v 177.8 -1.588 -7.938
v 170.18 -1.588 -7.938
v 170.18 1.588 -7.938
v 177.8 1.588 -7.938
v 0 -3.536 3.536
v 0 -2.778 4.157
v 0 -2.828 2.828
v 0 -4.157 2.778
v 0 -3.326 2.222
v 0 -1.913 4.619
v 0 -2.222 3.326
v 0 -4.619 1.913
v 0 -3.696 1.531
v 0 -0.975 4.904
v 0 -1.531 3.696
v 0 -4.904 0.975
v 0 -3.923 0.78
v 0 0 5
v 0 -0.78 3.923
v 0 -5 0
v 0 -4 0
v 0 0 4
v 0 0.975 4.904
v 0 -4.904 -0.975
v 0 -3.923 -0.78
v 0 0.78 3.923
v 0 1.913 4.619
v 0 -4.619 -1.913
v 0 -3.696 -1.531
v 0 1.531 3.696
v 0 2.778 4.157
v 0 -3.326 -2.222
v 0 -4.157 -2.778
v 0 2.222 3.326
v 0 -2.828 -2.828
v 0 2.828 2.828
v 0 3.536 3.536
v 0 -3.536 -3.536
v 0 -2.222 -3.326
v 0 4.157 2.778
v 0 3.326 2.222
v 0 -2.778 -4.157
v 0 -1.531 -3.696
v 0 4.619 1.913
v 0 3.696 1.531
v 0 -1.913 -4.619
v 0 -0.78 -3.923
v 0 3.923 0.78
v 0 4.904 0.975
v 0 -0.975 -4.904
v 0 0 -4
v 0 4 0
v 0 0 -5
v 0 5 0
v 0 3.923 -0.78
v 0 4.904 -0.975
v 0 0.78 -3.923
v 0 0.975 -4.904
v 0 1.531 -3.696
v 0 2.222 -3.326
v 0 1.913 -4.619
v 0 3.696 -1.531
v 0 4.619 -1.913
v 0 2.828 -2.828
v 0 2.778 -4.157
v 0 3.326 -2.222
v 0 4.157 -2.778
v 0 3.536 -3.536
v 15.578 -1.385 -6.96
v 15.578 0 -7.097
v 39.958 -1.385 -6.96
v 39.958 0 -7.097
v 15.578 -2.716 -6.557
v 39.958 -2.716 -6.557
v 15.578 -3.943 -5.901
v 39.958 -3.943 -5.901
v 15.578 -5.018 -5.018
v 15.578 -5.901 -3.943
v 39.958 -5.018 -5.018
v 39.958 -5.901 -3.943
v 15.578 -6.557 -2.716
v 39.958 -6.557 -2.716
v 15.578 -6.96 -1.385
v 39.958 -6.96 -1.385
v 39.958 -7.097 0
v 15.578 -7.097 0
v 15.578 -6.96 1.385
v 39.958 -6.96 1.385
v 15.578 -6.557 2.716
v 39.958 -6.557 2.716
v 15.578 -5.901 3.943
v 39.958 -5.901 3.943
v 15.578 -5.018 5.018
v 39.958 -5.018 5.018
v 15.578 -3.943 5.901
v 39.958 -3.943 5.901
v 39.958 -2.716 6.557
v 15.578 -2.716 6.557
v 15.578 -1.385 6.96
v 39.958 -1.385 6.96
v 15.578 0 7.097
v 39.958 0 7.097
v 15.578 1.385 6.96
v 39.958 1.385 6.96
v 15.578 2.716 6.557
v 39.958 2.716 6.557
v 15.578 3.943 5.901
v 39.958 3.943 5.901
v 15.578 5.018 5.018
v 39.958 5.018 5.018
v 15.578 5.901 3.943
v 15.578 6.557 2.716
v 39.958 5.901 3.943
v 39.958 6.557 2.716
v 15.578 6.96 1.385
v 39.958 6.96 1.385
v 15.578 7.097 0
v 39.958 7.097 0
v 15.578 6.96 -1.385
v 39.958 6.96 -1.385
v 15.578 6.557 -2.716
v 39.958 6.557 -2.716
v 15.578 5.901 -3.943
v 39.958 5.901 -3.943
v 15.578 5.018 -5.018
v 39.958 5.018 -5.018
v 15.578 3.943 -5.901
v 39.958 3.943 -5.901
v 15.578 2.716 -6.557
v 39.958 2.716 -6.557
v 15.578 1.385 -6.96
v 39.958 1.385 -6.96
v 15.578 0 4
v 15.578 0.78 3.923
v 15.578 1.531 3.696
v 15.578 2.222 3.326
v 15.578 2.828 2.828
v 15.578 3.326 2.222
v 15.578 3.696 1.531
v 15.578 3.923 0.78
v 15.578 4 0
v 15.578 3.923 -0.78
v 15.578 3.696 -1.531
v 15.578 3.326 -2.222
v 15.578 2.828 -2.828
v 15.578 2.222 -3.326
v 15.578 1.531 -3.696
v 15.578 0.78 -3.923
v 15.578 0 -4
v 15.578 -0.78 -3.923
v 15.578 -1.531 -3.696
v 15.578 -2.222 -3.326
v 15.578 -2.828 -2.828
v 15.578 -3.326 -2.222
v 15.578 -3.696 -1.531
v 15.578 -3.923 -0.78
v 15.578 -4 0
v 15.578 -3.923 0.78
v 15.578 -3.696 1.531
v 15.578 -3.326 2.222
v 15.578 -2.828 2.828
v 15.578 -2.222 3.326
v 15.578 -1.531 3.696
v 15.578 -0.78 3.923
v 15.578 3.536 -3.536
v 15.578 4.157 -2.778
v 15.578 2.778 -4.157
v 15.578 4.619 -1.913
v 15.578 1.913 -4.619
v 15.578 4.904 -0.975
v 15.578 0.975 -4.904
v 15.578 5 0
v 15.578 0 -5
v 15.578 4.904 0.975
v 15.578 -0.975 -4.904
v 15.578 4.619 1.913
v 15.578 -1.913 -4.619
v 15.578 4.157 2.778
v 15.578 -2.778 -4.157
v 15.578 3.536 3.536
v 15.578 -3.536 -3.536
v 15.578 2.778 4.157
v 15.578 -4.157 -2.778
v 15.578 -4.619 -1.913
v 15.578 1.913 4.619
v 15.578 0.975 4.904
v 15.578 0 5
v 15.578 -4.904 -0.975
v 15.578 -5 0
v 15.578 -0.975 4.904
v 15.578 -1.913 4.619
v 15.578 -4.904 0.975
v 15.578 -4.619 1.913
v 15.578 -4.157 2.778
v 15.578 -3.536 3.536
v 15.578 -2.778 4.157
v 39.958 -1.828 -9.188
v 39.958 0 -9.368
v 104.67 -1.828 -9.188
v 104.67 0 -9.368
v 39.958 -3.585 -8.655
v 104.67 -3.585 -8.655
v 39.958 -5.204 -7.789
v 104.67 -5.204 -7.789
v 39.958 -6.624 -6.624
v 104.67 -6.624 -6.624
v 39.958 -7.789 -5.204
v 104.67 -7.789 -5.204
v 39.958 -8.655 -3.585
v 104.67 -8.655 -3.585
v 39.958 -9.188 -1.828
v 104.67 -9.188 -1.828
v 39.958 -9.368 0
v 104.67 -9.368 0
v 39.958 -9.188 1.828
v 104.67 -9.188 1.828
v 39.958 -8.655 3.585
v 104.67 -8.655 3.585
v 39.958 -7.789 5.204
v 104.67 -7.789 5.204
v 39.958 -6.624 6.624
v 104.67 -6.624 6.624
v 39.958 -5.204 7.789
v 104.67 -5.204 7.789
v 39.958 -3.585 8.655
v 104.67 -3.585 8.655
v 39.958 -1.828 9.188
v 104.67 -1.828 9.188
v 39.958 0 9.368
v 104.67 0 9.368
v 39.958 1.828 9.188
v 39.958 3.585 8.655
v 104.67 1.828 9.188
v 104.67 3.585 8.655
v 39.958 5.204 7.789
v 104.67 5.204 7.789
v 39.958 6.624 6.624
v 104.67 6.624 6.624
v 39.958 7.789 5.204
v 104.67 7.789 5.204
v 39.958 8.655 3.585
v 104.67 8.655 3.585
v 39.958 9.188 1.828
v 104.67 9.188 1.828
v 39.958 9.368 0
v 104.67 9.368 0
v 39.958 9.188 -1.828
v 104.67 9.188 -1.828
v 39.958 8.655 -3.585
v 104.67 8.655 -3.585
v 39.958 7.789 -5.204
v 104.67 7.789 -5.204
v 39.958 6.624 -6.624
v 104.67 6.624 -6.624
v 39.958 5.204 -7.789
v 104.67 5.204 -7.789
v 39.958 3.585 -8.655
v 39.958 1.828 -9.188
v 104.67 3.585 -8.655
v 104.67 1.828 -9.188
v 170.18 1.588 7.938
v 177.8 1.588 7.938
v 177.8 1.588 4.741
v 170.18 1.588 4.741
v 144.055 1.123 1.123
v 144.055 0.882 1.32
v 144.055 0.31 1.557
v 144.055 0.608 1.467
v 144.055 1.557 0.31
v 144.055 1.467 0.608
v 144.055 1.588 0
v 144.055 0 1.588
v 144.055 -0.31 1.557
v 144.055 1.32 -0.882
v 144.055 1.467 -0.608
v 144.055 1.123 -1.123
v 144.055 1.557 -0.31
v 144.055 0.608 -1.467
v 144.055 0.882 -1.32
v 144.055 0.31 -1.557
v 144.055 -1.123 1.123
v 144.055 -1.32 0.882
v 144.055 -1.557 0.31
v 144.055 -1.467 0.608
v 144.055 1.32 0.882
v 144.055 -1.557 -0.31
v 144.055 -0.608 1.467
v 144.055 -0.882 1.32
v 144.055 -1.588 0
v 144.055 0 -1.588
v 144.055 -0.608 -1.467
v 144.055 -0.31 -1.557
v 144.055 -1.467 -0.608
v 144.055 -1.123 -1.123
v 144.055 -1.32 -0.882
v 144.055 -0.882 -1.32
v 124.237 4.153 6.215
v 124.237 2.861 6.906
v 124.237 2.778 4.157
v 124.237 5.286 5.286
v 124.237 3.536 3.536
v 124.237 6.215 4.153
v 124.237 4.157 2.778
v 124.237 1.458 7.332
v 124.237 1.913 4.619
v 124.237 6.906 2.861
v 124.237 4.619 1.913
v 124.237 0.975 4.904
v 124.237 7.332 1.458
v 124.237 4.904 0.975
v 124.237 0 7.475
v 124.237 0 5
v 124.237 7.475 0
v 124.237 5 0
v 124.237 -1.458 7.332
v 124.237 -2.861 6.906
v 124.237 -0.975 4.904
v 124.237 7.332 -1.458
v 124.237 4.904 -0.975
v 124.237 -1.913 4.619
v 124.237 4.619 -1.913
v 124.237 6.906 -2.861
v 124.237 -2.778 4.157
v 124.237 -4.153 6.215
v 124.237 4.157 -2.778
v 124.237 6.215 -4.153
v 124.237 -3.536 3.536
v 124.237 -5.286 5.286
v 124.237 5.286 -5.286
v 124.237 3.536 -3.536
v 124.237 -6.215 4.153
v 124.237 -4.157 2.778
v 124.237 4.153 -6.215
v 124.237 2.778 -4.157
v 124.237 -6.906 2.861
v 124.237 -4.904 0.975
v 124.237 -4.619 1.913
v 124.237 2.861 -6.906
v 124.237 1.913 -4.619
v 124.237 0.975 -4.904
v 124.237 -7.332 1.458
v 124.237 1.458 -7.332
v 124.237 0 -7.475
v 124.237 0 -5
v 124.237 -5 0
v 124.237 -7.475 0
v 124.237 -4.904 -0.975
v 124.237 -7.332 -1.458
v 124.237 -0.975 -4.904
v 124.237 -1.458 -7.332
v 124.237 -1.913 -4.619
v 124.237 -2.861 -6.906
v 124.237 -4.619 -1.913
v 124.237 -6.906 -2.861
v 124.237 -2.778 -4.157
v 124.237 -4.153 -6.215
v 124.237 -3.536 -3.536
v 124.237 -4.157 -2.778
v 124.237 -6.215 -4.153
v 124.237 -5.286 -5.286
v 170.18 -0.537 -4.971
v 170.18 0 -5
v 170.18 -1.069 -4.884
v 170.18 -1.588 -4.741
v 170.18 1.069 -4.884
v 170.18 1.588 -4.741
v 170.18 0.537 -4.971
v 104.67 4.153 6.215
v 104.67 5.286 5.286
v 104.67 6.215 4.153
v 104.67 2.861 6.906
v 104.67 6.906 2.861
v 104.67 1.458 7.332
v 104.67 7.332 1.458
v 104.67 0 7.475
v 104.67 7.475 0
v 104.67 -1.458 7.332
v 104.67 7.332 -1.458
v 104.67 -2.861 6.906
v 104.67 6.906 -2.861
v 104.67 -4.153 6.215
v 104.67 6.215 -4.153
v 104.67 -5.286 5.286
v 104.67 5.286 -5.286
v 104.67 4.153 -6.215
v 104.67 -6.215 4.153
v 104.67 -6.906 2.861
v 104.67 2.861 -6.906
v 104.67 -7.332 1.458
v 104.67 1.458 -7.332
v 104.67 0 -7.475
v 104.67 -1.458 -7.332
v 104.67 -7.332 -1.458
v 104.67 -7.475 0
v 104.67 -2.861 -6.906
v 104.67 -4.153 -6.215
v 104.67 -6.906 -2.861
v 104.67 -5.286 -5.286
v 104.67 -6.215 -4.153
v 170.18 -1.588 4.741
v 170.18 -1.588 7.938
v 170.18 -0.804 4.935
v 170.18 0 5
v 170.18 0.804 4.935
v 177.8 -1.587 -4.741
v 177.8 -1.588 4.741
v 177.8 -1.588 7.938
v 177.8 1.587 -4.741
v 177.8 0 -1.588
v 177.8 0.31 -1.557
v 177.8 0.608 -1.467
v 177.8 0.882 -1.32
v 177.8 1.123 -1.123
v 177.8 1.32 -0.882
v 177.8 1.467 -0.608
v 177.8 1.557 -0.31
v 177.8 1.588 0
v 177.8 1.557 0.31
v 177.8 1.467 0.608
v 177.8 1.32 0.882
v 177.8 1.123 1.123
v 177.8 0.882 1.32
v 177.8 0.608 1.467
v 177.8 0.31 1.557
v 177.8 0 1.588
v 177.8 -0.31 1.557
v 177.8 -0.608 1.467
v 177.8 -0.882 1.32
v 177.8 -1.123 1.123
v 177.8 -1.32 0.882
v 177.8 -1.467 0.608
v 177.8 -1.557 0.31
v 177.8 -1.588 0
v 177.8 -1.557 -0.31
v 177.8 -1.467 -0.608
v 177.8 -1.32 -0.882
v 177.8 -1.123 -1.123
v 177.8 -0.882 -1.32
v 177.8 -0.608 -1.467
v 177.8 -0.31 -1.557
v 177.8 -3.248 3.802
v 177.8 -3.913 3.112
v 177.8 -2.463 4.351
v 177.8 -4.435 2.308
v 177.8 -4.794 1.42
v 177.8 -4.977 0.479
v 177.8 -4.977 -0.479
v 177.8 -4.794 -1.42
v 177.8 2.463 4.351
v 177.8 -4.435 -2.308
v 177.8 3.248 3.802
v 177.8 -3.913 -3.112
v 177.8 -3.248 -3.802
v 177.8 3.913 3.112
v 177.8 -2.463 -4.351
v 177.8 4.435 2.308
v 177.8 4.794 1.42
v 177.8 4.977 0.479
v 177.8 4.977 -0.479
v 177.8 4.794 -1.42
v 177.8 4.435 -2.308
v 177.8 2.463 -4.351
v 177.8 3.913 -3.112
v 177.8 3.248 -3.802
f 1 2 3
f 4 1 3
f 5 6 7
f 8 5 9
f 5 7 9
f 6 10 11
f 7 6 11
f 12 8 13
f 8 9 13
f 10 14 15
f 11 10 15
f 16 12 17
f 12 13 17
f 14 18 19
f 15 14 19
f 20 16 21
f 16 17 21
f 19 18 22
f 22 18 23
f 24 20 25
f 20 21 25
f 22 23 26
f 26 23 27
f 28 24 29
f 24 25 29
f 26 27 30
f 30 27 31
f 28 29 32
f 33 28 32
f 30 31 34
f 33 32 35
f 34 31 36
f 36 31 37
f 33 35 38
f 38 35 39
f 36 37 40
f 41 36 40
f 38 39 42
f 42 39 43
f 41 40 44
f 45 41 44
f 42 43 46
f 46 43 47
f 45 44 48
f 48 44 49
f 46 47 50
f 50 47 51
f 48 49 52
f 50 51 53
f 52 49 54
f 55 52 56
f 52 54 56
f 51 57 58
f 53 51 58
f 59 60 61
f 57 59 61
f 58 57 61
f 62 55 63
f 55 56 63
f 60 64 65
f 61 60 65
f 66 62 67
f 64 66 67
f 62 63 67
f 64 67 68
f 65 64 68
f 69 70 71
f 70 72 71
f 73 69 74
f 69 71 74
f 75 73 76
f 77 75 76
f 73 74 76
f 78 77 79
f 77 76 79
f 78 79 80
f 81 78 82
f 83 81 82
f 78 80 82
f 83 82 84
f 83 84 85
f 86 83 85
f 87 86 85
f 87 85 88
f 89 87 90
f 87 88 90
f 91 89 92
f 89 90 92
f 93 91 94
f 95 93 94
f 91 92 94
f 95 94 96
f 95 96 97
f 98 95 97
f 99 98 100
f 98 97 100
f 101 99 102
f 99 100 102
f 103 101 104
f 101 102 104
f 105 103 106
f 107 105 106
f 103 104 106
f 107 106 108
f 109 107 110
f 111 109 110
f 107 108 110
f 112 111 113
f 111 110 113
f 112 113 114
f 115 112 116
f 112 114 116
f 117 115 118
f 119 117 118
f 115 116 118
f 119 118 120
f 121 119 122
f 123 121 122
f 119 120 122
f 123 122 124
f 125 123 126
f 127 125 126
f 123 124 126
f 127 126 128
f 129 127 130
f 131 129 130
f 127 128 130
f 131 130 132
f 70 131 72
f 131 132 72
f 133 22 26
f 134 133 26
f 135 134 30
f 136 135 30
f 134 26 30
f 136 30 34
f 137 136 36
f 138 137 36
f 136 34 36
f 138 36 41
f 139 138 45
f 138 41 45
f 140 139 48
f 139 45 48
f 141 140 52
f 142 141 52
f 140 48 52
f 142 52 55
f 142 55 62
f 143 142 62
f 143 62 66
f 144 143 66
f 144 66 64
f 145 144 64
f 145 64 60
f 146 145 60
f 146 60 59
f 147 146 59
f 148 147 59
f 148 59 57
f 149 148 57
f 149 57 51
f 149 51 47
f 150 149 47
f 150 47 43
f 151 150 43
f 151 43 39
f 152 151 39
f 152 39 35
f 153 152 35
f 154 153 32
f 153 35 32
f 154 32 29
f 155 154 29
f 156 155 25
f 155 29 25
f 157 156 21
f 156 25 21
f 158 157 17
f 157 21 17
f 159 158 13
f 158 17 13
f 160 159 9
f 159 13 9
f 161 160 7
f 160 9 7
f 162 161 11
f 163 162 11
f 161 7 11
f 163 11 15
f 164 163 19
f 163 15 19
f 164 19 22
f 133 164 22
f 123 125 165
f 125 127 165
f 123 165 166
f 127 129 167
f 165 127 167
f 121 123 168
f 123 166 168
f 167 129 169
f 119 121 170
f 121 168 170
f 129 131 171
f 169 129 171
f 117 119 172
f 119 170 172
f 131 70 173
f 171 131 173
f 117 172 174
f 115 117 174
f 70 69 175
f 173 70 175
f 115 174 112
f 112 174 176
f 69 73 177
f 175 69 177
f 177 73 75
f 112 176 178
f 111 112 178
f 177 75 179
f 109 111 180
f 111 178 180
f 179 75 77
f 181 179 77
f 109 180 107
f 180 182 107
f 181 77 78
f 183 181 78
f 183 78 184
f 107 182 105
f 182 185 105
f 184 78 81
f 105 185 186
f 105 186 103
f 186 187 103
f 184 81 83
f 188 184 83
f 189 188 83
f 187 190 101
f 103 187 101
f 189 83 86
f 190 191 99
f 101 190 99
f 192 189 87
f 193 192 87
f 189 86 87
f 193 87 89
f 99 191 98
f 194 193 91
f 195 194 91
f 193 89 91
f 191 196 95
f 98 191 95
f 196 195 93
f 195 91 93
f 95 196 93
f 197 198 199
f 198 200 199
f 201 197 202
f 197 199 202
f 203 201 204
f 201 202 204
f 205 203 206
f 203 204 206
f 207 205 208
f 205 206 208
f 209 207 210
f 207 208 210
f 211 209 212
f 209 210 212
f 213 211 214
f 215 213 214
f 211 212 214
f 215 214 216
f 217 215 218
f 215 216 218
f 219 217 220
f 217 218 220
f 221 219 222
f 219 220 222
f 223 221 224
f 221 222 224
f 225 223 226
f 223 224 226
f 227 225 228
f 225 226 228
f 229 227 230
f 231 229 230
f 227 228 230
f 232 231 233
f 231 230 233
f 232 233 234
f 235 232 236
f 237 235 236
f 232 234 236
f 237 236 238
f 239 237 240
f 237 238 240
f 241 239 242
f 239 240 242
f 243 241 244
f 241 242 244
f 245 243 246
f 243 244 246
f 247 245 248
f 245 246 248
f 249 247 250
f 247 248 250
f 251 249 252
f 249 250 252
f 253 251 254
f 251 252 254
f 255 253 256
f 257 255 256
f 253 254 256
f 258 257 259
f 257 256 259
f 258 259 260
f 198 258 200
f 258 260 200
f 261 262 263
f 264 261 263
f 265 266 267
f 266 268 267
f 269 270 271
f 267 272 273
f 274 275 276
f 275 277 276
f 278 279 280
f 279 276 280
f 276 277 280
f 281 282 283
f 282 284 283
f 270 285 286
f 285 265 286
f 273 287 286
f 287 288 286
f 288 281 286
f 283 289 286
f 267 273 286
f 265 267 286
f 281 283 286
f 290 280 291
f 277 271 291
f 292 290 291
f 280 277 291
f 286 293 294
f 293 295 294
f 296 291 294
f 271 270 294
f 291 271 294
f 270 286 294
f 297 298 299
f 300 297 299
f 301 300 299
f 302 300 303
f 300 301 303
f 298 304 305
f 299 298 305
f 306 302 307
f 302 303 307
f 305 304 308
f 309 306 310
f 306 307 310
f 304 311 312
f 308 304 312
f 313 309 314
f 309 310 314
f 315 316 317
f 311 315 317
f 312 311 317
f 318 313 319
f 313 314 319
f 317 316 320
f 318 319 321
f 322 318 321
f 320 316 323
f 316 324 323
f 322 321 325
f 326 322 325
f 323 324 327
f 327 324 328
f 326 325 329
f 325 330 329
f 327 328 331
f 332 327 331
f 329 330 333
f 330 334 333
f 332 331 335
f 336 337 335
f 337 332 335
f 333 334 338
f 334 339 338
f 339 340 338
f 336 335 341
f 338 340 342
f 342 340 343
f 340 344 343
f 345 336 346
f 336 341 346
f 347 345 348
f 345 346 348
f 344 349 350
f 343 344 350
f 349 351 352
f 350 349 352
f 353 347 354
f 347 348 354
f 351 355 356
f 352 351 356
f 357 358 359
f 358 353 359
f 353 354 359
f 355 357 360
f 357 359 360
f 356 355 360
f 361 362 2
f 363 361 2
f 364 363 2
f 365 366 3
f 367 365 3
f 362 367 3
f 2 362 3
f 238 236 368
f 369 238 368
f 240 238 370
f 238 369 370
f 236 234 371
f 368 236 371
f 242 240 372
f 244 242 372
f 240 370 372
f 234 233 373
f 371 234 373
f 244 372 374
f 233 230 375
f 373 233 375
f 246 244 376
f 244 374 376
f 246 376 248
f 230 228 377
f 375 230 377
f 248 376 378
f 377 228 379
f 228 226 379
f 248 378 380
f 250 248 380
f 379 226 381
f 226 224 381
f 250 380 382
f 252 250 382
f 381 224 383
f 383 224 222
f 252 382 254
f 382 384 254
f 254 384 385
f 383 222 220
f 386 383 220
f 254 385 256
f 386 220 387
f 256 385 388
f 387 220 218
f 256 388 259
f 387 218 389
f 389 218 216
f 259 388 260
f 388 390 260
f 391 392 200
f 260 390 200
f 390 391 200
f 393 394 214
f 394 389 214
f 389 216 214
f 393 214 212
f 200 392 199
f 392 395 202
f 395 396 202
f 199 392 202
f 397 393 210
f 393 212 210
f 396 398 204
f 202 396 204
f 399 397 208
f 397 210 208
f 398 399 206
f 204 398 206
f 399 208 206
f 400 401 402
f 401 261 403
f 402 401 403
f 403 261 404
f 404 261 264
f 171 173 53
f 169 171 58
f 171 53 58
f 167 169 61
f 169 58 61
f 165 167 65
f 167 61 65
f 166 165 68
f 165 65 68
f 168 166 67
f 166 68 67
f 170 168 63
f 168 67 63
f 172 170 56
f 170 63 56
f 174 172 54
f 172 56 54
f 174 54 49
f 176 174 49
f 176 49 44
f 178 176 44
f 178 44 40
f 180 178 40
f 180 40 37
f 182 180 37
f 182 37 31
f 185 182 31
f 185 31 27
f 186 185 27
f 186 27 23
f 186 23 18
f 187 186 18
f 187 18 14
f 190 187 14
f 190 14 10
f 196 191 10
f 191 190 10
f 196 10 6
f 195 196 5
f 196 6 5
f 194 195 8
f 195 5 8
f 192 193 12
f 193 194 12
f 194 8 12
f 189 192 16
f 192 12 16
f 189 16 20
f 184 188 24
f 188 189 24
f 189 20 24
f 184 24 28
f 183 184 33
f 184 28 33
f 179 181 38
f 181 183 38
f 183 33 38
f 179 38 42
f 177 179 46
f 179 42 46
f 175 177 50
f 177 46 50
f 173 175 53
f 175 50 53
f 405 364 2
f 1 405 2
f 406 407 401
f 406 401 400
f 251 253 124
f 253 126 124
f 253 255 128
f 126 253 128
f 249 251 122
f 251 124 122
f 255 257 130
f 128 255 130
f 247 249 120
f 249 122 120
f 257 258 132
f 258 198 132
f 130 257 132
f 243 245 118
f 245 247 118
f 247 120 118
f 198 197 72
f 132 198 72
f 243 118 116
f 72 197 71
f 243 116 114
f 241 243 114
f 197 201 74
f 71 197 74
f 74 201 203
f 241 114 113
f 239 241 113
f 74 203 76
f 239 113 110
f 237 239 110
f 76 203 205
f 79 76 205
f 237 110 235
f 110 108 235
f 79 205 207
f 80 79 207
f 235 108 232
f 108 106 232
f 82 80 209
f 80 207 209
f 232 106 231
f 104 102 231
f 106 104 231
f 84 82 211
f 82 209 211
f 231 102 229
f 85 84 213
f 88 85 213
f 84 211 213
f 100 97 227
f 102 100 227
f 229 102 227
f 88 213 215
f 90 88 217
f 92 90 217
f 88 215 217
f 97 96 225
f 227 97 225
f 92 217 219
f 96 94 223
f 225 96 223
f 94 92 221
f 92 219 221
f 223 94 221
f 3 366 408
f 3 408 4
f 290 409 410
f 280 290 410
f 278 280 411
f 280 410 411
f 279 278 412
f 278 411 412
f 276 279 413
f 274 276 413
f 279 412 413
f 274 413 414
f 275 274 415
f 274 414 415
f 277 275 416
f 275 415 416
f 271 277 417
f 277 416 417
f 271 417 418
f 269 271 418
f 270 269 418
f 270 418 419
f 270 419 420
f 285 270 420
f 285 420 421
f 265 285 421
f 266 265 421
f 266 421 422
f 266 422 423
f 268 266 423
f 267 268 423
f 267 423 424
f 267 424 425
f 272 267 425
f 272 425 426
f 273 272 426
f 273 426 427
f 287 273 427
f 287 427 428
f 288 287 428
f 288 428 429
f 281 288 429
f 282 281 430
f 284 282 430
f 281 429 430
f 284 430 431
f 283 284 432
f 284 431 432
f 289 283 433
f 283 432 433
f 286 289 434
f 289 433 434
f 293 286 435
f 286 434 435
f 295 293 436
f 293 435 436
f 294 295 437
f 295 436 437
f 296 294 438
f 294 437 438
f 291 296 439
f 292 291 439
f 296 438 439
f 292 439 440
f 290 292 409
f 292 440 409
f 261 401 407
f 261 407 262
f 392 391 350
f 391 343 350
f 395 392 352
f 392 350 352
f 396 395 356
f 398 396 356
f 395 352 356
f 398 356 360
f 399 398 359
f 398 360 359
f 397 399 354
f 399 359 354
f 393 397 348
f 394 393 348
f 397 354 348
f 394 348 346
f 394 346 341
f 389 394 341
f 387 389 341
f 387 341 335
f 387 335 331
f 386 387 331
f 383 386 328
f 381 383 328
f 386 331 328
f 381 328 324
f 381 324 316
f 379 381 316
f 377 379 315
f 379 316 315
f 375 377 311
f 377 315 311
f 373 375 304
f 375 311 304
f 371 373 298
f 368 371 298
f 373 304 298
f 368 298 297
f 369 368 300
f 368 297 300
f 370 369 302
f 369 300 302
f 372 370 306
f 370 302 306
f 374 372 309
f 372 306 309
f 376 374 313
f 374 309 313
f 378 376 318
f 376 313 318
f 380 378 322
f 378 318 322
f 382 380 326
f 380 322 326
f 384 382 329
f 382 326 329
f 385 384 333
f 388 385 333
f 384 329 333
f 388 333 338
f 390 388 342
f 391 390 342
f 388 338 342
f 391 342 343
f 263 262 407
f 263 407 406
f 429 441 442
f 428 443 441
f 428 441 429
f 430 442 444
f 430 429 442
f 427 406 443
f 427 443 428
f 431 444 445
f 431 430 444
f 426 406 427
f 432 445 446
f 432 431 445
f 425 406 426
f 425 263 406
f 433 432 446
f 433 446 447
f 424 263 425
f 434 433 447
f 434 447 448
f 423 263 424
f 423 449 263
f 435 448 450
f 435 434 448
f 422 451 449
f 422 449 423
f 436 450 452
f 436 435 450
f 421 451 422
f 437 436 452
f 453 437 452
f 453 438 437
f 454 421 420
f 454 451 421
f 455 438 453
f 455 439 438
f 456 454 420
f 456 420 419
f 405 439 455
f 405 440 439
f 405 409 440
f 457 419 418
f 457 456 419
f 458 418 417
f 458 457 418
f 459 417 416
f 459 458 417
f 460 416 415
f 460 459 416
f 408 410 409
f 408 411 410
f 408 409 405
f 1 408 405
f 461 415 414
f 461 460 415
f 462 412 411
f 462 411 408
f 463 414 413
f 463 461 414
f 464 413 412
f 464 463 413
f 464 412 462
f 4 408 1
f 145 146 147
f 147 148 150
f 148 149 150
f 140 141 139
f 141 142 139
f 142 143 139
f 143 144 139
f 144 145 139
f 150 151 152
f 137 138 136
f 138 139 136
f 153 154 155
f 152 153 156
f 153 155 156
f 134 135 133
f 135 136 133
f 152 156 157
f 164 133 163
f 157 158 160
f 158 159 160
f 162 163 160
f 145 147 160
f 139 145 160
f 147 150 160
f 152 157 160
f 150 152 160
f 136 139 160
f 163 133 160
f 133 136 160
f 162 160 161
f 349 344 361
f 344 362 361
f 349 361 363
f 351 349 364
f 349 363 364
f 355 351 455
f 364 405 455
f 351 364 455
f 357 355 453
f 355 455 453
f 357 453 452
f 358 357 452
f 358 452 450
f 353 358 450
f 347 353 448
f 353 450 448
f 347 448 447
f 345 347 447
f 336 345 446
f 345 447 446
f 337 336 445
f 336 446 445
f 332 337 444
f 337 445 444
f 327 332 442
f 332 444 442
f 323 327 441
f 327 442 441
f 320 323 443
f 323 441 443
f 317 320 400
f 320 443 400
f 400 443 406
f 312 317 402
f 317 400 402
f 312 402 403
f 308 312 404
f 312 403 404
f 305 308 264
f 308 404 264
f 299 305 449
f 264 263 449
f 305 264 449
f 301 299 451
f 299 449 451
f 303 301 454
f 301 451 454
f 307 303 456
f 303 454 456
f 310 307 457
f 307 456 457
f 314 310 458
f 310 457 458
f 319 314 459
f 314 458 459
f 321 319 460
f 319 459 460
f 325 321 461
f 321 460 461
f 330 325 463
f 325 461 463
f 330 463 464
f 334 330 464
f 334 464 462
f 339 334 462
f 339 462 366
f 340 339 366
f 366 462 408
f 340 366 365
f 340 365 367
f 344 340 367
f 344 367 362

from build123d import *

# Parameters (mm, degrees)
SKETCH1_R            = 5
SHAFT_DEPTH          = 177.8
SKETCH2_W            = 15.875
SKETCH2_H            = 3.175
SHAFT_KEY_MALE_DEPTH = 7.62
SKETCH3_R            = 1.5875
BOLT_BORE_DEPTH      = 50.8
SKETCH4_R            = 4
CUT_EXTRUDE1_DEPTH   = 25.4


with BuildPart() as part:
    # Sketch1 → Shaft (new body)
    with BuildSketch(Plane(origin=(0, 0, 0), x_dir=(0, 0, -1), z_dir=(1, 0, 0))):
        Circle(SKETCH1_R)
    extrude(amount=SHAFT_DEPTH)

    # Sketch2 → Shaft Key Male (add)
    with BuildSketch(Plane(origin=(177.8, 0, 0), x_dir=(0, 0, -1), z_dir=(1, 0, 0))):
        Rectangle(SKETCH2_W, SKETCH2_H)
    extrude(amount=-SHAFT_KEY_MALE_DEPTH)

    # Sketch3 → Bolt Bore (cut)
    with BuildSketch(Plane(origin=(177.8, 0, 0), x_dir=(0, 0, -1), z_dir=(1, 0, 0))):
        Circle(SKETCH3_R)
    extrude(amount=-BOLT_BORE_DEPTH, mode=Mode.SUBTRACT)

    # Sketch4 → Cut-Extrude1 (cut)
    with BuildSketch(Plane.ZY):
        Circle(SKETCH4_R)
    extrude(amount=-CUT_EXTRUDE1_DEPTH, mode=Mode.SUBTRACT)

    # Sketch5 → Revolve1 (revolve)
    with BuildSketch(Plane(origin=(0, 0, 0), x_dir=(1, 0, 0), z_dir=(0, 1, 0)), mode=Mode.PRIVATE) as revolve1_sk:
        Polygon((144.055202203, 0), (15.578475915, 0), (15.578475915, -7.096721058), (39.957910275, -7.096721058), (39.957910275, -9.367671796), (104.670198298, -9.367671796), (104.670198298, -7.475212847), (124.236525445, -7.475212847), (124.236525445, -5), (144.055202203, -5), align=None)
    revolve(revolve1_sk.sketch.rotate(Axis((144.055202203, 0, 0), (-1, 0, 0)), 180), axis=Axis((144.055202203, 0, 0), (-1, 0, 0)))


solid = part.part
